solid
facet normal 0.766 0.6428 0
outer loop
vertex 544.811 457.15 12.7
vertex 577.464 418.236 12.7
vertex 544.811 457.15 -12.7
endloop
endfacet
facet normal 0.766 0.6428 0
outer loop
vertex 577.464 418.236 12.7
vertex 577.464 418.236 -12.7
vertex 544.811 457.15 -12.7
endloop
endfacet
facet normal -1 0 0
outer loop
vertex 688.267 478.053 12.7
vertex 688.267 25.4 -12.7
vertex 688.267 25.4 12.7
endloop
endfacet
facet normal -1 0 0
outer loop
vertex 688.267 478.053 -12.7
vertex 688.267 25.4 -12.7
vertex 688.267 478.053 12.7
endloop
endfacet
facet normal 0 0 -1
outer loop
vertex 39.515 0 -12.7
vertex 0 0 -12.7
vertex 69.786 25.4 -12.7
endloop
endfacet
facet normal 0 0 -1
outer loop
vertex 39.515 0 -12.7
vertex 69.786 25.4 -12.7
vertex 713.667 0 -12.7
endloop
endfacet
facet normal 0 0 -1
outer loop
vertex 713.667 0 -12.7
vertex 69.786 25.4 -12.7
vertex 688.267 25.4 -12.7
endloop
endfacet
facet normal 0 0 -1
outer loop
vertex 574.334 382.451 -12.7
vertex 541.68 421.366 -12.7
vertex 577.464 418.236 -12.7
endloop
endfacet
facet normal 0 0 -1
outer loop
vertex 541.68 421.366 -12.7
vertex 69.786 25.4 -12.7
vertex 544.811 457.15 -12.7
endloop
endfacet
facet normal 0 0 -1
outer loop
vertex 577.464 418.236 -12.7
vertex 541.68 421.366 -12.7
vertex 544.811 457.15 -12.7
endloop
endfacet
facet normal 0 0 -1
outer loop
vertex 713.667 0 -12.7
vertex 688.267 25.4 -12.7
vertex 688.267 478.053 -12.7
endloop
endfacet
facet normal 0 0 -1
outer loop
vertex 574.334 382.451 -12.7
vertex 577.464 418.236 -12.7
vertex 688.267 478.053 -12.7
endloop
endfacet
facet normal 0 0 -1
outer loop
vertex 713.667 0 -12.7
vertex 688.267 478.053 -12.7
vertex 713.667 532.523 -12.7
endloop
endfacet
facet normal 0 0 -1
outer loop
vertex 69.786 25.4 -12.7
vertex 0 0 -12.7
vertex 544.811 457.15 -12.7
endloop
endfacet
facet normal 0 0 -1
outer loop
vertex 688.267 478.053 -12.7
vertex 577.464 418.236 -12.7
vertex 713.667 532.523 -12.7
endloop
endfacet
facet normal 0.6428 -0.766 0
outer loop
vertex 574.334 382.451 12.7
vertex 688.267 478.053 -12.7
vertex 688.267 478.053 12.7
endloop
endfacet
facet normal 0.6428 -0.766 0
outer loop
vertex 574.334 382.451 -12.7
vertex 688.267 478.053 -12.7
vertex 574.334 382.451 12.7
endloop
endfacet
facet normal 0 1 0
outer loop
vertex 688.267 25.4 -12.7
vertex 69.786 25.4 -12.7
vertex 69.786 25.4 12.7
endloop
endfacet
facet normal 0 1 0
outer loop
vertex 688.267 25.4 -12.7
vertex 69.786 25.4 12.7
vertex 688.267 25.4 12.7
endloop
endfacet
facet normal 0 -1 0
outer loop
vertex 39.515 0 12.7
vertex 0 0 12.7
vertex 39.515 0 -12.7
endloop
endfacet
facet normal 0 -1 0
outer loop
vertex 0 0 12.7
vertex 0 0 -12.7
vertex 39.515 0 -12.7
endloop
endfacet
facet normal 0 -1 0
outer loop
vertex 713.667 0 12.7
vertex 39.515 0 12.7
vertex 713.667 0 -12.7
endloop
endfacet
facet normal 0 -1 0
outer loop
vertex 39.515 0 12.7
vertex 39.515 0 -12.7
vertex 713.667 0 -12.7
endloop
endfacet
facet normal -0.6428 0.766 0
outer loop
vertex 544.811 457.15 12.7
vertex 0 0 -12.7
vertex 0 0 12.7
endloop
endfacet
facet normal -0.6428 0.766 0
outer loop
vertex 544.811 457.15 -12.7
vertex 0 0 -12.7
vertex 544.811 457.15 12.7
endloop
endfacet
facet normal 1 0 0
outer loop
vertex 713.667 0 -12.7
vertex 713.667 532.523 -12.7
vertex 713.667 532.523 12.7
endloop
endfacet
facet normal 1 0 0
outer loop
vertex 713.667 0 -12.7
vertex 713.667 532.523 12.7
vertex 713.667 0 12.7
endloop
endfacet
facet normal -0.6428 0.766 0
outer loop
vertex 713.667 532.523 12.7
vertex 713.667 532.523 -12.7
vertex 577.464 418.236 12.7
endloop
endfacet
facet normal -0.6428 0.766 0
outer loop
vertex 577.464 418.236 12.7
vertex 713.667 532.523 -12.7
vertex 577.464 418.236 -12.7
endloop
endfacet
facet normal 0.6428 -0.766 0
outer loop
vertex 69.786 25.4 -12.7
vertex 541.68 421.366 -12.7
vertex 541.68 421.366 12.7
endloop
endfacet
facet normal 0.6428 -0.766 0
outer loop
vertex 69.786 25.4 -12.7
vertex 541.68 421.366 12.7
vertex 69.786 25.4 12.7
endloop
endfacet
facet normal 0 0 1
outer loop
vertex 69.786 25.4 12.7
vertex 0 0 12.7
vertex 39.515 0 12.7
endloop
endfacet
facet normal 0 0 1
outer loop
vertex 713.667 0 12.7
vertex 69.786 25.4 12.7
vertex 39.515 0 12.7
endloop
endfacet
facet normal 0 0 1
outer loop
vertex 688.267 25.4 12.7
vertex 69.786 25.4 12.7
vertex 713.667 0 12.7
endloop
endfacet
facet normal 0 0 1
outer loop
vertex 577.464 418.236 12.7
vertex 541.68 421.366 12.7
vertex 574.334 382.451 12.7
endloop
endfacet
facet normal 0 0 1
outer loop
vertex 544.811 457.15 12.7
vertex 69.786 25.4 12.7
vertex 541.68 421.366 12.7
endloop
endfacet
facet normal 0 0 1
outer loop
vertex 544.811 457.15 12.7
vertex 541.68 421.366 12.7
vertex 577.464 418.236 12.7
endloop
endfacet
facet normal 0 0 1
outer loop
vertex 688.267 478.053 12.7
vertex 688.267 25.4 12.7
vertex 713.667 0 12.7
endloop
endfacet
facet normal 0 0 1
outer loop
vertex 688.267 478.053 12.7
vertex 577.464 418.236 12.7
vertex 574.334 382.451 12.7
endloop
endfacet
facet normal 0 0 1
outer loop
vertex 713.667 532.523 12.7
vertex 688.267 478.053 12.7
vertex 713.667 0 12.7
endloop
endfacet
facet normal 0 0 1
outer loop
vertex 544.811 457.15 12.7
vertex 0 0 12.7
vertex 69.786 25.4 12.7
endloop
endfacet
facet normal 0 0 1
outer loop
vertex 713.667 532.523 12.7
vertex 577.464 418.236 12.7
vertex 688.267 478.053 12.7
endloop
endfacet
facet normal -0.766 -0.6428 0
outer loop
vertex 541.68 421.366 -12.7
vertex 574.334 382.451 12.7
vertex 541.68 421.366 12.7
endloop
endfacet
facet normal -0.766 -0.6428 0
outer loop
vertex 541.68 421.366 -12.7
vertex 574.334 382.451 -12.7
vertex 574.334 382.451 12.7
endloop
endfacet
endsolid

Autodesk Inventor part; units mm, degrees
sketch "Sketch1" plane through (0, 0, 0) normal (0, 0, 1) x (1, 0, 0)
  line L0 (0, 0) -> (544.8108, 457.1505)
  line L1 (0, 0) -> (749.0326, 0)
  line L2 (713.6671, 532.5231) -> (713.6671, 0)
  line L3 (713.6671, 532.5231) -> (577.4644, 418.2355)
  line L4 (577.4644, 418.2355) -> (544.8108, 457.1505)
  line L5 (69.7859, 25.4) -> (688.2671, 25.4)
  line L6 (688.2671, 25.4) -> (688.2671, 478.0527)
  line L7 (688.2671, 478.0527) -> (574.3337, 382.4512)
  line L8 (574.3337, 382.4512) -> (541.6801, 421.3662)
  line L9 (541.6801, 421.3662) -> (69.7859, 25.4)
  line L10 (688.2671, 511.21) -> (688.2671, 628.3123) construction
  line L11 (69.7859, 25.4) -> (39.5154, 0)
  line L12 (577.4644, 418.2355) -> (593.7912, 398.778) construction
  line L13 (688.2671, 25.4) -> (688.2671, 0) construction
  line L14 (688.2671, 25.4) -> (713.6671, 25.4) construction
  line L15 (541.6801, 421.3662) -> (525.3533, 440.8237) construction
  dimension "d10" = 40
  dimension "d14" = 177.8
  dimension "d15" = 711.2
  dimension "d16" = 50.8
  dimension "d17" = 25.4
  dimension "d18" = 25.4
  dimension "d19" = 25.4
  dimension "d20" = 25.4
  dimension "d21" = 25.4
  dimension "d33" = 50
  dimension "d36" = 76.2
  dimension "d40" = 618.4812
  dimension "d41" = 648.7517
  dimension "d42" = 688.2671
  dimension "d43" = 713.6671
  dimension "d44" = 452.6526
  dimension "d45" = 478.0527
  dimension "d46" = 507.1231
  dimension "d47" = 532.5231
  dimension "d48" = 685.8
extrude "Extrusion1" add sketch "Sketch1" along normal mid plane 25.4
ref_plane "planeForPowerCells" through (-48.9804, 58.3726, 12.7) normal (-0.6428, 0.766, 0) x (0.766, 0.6428, 0)
ref_plane "planeForShootingPowerCells" through (528.484, 476.6081, 12.7) normal (-0.6428, 0.766, 0) x (0.766, 0.6428, 0)
ref_plane "Work Plane3" through (612.9122, 514.2944, 12.7) normal (0.766, 0.6428, 0) x (0, 0, -1)
properties part number "ballRampWithPocketForPowerCell"
